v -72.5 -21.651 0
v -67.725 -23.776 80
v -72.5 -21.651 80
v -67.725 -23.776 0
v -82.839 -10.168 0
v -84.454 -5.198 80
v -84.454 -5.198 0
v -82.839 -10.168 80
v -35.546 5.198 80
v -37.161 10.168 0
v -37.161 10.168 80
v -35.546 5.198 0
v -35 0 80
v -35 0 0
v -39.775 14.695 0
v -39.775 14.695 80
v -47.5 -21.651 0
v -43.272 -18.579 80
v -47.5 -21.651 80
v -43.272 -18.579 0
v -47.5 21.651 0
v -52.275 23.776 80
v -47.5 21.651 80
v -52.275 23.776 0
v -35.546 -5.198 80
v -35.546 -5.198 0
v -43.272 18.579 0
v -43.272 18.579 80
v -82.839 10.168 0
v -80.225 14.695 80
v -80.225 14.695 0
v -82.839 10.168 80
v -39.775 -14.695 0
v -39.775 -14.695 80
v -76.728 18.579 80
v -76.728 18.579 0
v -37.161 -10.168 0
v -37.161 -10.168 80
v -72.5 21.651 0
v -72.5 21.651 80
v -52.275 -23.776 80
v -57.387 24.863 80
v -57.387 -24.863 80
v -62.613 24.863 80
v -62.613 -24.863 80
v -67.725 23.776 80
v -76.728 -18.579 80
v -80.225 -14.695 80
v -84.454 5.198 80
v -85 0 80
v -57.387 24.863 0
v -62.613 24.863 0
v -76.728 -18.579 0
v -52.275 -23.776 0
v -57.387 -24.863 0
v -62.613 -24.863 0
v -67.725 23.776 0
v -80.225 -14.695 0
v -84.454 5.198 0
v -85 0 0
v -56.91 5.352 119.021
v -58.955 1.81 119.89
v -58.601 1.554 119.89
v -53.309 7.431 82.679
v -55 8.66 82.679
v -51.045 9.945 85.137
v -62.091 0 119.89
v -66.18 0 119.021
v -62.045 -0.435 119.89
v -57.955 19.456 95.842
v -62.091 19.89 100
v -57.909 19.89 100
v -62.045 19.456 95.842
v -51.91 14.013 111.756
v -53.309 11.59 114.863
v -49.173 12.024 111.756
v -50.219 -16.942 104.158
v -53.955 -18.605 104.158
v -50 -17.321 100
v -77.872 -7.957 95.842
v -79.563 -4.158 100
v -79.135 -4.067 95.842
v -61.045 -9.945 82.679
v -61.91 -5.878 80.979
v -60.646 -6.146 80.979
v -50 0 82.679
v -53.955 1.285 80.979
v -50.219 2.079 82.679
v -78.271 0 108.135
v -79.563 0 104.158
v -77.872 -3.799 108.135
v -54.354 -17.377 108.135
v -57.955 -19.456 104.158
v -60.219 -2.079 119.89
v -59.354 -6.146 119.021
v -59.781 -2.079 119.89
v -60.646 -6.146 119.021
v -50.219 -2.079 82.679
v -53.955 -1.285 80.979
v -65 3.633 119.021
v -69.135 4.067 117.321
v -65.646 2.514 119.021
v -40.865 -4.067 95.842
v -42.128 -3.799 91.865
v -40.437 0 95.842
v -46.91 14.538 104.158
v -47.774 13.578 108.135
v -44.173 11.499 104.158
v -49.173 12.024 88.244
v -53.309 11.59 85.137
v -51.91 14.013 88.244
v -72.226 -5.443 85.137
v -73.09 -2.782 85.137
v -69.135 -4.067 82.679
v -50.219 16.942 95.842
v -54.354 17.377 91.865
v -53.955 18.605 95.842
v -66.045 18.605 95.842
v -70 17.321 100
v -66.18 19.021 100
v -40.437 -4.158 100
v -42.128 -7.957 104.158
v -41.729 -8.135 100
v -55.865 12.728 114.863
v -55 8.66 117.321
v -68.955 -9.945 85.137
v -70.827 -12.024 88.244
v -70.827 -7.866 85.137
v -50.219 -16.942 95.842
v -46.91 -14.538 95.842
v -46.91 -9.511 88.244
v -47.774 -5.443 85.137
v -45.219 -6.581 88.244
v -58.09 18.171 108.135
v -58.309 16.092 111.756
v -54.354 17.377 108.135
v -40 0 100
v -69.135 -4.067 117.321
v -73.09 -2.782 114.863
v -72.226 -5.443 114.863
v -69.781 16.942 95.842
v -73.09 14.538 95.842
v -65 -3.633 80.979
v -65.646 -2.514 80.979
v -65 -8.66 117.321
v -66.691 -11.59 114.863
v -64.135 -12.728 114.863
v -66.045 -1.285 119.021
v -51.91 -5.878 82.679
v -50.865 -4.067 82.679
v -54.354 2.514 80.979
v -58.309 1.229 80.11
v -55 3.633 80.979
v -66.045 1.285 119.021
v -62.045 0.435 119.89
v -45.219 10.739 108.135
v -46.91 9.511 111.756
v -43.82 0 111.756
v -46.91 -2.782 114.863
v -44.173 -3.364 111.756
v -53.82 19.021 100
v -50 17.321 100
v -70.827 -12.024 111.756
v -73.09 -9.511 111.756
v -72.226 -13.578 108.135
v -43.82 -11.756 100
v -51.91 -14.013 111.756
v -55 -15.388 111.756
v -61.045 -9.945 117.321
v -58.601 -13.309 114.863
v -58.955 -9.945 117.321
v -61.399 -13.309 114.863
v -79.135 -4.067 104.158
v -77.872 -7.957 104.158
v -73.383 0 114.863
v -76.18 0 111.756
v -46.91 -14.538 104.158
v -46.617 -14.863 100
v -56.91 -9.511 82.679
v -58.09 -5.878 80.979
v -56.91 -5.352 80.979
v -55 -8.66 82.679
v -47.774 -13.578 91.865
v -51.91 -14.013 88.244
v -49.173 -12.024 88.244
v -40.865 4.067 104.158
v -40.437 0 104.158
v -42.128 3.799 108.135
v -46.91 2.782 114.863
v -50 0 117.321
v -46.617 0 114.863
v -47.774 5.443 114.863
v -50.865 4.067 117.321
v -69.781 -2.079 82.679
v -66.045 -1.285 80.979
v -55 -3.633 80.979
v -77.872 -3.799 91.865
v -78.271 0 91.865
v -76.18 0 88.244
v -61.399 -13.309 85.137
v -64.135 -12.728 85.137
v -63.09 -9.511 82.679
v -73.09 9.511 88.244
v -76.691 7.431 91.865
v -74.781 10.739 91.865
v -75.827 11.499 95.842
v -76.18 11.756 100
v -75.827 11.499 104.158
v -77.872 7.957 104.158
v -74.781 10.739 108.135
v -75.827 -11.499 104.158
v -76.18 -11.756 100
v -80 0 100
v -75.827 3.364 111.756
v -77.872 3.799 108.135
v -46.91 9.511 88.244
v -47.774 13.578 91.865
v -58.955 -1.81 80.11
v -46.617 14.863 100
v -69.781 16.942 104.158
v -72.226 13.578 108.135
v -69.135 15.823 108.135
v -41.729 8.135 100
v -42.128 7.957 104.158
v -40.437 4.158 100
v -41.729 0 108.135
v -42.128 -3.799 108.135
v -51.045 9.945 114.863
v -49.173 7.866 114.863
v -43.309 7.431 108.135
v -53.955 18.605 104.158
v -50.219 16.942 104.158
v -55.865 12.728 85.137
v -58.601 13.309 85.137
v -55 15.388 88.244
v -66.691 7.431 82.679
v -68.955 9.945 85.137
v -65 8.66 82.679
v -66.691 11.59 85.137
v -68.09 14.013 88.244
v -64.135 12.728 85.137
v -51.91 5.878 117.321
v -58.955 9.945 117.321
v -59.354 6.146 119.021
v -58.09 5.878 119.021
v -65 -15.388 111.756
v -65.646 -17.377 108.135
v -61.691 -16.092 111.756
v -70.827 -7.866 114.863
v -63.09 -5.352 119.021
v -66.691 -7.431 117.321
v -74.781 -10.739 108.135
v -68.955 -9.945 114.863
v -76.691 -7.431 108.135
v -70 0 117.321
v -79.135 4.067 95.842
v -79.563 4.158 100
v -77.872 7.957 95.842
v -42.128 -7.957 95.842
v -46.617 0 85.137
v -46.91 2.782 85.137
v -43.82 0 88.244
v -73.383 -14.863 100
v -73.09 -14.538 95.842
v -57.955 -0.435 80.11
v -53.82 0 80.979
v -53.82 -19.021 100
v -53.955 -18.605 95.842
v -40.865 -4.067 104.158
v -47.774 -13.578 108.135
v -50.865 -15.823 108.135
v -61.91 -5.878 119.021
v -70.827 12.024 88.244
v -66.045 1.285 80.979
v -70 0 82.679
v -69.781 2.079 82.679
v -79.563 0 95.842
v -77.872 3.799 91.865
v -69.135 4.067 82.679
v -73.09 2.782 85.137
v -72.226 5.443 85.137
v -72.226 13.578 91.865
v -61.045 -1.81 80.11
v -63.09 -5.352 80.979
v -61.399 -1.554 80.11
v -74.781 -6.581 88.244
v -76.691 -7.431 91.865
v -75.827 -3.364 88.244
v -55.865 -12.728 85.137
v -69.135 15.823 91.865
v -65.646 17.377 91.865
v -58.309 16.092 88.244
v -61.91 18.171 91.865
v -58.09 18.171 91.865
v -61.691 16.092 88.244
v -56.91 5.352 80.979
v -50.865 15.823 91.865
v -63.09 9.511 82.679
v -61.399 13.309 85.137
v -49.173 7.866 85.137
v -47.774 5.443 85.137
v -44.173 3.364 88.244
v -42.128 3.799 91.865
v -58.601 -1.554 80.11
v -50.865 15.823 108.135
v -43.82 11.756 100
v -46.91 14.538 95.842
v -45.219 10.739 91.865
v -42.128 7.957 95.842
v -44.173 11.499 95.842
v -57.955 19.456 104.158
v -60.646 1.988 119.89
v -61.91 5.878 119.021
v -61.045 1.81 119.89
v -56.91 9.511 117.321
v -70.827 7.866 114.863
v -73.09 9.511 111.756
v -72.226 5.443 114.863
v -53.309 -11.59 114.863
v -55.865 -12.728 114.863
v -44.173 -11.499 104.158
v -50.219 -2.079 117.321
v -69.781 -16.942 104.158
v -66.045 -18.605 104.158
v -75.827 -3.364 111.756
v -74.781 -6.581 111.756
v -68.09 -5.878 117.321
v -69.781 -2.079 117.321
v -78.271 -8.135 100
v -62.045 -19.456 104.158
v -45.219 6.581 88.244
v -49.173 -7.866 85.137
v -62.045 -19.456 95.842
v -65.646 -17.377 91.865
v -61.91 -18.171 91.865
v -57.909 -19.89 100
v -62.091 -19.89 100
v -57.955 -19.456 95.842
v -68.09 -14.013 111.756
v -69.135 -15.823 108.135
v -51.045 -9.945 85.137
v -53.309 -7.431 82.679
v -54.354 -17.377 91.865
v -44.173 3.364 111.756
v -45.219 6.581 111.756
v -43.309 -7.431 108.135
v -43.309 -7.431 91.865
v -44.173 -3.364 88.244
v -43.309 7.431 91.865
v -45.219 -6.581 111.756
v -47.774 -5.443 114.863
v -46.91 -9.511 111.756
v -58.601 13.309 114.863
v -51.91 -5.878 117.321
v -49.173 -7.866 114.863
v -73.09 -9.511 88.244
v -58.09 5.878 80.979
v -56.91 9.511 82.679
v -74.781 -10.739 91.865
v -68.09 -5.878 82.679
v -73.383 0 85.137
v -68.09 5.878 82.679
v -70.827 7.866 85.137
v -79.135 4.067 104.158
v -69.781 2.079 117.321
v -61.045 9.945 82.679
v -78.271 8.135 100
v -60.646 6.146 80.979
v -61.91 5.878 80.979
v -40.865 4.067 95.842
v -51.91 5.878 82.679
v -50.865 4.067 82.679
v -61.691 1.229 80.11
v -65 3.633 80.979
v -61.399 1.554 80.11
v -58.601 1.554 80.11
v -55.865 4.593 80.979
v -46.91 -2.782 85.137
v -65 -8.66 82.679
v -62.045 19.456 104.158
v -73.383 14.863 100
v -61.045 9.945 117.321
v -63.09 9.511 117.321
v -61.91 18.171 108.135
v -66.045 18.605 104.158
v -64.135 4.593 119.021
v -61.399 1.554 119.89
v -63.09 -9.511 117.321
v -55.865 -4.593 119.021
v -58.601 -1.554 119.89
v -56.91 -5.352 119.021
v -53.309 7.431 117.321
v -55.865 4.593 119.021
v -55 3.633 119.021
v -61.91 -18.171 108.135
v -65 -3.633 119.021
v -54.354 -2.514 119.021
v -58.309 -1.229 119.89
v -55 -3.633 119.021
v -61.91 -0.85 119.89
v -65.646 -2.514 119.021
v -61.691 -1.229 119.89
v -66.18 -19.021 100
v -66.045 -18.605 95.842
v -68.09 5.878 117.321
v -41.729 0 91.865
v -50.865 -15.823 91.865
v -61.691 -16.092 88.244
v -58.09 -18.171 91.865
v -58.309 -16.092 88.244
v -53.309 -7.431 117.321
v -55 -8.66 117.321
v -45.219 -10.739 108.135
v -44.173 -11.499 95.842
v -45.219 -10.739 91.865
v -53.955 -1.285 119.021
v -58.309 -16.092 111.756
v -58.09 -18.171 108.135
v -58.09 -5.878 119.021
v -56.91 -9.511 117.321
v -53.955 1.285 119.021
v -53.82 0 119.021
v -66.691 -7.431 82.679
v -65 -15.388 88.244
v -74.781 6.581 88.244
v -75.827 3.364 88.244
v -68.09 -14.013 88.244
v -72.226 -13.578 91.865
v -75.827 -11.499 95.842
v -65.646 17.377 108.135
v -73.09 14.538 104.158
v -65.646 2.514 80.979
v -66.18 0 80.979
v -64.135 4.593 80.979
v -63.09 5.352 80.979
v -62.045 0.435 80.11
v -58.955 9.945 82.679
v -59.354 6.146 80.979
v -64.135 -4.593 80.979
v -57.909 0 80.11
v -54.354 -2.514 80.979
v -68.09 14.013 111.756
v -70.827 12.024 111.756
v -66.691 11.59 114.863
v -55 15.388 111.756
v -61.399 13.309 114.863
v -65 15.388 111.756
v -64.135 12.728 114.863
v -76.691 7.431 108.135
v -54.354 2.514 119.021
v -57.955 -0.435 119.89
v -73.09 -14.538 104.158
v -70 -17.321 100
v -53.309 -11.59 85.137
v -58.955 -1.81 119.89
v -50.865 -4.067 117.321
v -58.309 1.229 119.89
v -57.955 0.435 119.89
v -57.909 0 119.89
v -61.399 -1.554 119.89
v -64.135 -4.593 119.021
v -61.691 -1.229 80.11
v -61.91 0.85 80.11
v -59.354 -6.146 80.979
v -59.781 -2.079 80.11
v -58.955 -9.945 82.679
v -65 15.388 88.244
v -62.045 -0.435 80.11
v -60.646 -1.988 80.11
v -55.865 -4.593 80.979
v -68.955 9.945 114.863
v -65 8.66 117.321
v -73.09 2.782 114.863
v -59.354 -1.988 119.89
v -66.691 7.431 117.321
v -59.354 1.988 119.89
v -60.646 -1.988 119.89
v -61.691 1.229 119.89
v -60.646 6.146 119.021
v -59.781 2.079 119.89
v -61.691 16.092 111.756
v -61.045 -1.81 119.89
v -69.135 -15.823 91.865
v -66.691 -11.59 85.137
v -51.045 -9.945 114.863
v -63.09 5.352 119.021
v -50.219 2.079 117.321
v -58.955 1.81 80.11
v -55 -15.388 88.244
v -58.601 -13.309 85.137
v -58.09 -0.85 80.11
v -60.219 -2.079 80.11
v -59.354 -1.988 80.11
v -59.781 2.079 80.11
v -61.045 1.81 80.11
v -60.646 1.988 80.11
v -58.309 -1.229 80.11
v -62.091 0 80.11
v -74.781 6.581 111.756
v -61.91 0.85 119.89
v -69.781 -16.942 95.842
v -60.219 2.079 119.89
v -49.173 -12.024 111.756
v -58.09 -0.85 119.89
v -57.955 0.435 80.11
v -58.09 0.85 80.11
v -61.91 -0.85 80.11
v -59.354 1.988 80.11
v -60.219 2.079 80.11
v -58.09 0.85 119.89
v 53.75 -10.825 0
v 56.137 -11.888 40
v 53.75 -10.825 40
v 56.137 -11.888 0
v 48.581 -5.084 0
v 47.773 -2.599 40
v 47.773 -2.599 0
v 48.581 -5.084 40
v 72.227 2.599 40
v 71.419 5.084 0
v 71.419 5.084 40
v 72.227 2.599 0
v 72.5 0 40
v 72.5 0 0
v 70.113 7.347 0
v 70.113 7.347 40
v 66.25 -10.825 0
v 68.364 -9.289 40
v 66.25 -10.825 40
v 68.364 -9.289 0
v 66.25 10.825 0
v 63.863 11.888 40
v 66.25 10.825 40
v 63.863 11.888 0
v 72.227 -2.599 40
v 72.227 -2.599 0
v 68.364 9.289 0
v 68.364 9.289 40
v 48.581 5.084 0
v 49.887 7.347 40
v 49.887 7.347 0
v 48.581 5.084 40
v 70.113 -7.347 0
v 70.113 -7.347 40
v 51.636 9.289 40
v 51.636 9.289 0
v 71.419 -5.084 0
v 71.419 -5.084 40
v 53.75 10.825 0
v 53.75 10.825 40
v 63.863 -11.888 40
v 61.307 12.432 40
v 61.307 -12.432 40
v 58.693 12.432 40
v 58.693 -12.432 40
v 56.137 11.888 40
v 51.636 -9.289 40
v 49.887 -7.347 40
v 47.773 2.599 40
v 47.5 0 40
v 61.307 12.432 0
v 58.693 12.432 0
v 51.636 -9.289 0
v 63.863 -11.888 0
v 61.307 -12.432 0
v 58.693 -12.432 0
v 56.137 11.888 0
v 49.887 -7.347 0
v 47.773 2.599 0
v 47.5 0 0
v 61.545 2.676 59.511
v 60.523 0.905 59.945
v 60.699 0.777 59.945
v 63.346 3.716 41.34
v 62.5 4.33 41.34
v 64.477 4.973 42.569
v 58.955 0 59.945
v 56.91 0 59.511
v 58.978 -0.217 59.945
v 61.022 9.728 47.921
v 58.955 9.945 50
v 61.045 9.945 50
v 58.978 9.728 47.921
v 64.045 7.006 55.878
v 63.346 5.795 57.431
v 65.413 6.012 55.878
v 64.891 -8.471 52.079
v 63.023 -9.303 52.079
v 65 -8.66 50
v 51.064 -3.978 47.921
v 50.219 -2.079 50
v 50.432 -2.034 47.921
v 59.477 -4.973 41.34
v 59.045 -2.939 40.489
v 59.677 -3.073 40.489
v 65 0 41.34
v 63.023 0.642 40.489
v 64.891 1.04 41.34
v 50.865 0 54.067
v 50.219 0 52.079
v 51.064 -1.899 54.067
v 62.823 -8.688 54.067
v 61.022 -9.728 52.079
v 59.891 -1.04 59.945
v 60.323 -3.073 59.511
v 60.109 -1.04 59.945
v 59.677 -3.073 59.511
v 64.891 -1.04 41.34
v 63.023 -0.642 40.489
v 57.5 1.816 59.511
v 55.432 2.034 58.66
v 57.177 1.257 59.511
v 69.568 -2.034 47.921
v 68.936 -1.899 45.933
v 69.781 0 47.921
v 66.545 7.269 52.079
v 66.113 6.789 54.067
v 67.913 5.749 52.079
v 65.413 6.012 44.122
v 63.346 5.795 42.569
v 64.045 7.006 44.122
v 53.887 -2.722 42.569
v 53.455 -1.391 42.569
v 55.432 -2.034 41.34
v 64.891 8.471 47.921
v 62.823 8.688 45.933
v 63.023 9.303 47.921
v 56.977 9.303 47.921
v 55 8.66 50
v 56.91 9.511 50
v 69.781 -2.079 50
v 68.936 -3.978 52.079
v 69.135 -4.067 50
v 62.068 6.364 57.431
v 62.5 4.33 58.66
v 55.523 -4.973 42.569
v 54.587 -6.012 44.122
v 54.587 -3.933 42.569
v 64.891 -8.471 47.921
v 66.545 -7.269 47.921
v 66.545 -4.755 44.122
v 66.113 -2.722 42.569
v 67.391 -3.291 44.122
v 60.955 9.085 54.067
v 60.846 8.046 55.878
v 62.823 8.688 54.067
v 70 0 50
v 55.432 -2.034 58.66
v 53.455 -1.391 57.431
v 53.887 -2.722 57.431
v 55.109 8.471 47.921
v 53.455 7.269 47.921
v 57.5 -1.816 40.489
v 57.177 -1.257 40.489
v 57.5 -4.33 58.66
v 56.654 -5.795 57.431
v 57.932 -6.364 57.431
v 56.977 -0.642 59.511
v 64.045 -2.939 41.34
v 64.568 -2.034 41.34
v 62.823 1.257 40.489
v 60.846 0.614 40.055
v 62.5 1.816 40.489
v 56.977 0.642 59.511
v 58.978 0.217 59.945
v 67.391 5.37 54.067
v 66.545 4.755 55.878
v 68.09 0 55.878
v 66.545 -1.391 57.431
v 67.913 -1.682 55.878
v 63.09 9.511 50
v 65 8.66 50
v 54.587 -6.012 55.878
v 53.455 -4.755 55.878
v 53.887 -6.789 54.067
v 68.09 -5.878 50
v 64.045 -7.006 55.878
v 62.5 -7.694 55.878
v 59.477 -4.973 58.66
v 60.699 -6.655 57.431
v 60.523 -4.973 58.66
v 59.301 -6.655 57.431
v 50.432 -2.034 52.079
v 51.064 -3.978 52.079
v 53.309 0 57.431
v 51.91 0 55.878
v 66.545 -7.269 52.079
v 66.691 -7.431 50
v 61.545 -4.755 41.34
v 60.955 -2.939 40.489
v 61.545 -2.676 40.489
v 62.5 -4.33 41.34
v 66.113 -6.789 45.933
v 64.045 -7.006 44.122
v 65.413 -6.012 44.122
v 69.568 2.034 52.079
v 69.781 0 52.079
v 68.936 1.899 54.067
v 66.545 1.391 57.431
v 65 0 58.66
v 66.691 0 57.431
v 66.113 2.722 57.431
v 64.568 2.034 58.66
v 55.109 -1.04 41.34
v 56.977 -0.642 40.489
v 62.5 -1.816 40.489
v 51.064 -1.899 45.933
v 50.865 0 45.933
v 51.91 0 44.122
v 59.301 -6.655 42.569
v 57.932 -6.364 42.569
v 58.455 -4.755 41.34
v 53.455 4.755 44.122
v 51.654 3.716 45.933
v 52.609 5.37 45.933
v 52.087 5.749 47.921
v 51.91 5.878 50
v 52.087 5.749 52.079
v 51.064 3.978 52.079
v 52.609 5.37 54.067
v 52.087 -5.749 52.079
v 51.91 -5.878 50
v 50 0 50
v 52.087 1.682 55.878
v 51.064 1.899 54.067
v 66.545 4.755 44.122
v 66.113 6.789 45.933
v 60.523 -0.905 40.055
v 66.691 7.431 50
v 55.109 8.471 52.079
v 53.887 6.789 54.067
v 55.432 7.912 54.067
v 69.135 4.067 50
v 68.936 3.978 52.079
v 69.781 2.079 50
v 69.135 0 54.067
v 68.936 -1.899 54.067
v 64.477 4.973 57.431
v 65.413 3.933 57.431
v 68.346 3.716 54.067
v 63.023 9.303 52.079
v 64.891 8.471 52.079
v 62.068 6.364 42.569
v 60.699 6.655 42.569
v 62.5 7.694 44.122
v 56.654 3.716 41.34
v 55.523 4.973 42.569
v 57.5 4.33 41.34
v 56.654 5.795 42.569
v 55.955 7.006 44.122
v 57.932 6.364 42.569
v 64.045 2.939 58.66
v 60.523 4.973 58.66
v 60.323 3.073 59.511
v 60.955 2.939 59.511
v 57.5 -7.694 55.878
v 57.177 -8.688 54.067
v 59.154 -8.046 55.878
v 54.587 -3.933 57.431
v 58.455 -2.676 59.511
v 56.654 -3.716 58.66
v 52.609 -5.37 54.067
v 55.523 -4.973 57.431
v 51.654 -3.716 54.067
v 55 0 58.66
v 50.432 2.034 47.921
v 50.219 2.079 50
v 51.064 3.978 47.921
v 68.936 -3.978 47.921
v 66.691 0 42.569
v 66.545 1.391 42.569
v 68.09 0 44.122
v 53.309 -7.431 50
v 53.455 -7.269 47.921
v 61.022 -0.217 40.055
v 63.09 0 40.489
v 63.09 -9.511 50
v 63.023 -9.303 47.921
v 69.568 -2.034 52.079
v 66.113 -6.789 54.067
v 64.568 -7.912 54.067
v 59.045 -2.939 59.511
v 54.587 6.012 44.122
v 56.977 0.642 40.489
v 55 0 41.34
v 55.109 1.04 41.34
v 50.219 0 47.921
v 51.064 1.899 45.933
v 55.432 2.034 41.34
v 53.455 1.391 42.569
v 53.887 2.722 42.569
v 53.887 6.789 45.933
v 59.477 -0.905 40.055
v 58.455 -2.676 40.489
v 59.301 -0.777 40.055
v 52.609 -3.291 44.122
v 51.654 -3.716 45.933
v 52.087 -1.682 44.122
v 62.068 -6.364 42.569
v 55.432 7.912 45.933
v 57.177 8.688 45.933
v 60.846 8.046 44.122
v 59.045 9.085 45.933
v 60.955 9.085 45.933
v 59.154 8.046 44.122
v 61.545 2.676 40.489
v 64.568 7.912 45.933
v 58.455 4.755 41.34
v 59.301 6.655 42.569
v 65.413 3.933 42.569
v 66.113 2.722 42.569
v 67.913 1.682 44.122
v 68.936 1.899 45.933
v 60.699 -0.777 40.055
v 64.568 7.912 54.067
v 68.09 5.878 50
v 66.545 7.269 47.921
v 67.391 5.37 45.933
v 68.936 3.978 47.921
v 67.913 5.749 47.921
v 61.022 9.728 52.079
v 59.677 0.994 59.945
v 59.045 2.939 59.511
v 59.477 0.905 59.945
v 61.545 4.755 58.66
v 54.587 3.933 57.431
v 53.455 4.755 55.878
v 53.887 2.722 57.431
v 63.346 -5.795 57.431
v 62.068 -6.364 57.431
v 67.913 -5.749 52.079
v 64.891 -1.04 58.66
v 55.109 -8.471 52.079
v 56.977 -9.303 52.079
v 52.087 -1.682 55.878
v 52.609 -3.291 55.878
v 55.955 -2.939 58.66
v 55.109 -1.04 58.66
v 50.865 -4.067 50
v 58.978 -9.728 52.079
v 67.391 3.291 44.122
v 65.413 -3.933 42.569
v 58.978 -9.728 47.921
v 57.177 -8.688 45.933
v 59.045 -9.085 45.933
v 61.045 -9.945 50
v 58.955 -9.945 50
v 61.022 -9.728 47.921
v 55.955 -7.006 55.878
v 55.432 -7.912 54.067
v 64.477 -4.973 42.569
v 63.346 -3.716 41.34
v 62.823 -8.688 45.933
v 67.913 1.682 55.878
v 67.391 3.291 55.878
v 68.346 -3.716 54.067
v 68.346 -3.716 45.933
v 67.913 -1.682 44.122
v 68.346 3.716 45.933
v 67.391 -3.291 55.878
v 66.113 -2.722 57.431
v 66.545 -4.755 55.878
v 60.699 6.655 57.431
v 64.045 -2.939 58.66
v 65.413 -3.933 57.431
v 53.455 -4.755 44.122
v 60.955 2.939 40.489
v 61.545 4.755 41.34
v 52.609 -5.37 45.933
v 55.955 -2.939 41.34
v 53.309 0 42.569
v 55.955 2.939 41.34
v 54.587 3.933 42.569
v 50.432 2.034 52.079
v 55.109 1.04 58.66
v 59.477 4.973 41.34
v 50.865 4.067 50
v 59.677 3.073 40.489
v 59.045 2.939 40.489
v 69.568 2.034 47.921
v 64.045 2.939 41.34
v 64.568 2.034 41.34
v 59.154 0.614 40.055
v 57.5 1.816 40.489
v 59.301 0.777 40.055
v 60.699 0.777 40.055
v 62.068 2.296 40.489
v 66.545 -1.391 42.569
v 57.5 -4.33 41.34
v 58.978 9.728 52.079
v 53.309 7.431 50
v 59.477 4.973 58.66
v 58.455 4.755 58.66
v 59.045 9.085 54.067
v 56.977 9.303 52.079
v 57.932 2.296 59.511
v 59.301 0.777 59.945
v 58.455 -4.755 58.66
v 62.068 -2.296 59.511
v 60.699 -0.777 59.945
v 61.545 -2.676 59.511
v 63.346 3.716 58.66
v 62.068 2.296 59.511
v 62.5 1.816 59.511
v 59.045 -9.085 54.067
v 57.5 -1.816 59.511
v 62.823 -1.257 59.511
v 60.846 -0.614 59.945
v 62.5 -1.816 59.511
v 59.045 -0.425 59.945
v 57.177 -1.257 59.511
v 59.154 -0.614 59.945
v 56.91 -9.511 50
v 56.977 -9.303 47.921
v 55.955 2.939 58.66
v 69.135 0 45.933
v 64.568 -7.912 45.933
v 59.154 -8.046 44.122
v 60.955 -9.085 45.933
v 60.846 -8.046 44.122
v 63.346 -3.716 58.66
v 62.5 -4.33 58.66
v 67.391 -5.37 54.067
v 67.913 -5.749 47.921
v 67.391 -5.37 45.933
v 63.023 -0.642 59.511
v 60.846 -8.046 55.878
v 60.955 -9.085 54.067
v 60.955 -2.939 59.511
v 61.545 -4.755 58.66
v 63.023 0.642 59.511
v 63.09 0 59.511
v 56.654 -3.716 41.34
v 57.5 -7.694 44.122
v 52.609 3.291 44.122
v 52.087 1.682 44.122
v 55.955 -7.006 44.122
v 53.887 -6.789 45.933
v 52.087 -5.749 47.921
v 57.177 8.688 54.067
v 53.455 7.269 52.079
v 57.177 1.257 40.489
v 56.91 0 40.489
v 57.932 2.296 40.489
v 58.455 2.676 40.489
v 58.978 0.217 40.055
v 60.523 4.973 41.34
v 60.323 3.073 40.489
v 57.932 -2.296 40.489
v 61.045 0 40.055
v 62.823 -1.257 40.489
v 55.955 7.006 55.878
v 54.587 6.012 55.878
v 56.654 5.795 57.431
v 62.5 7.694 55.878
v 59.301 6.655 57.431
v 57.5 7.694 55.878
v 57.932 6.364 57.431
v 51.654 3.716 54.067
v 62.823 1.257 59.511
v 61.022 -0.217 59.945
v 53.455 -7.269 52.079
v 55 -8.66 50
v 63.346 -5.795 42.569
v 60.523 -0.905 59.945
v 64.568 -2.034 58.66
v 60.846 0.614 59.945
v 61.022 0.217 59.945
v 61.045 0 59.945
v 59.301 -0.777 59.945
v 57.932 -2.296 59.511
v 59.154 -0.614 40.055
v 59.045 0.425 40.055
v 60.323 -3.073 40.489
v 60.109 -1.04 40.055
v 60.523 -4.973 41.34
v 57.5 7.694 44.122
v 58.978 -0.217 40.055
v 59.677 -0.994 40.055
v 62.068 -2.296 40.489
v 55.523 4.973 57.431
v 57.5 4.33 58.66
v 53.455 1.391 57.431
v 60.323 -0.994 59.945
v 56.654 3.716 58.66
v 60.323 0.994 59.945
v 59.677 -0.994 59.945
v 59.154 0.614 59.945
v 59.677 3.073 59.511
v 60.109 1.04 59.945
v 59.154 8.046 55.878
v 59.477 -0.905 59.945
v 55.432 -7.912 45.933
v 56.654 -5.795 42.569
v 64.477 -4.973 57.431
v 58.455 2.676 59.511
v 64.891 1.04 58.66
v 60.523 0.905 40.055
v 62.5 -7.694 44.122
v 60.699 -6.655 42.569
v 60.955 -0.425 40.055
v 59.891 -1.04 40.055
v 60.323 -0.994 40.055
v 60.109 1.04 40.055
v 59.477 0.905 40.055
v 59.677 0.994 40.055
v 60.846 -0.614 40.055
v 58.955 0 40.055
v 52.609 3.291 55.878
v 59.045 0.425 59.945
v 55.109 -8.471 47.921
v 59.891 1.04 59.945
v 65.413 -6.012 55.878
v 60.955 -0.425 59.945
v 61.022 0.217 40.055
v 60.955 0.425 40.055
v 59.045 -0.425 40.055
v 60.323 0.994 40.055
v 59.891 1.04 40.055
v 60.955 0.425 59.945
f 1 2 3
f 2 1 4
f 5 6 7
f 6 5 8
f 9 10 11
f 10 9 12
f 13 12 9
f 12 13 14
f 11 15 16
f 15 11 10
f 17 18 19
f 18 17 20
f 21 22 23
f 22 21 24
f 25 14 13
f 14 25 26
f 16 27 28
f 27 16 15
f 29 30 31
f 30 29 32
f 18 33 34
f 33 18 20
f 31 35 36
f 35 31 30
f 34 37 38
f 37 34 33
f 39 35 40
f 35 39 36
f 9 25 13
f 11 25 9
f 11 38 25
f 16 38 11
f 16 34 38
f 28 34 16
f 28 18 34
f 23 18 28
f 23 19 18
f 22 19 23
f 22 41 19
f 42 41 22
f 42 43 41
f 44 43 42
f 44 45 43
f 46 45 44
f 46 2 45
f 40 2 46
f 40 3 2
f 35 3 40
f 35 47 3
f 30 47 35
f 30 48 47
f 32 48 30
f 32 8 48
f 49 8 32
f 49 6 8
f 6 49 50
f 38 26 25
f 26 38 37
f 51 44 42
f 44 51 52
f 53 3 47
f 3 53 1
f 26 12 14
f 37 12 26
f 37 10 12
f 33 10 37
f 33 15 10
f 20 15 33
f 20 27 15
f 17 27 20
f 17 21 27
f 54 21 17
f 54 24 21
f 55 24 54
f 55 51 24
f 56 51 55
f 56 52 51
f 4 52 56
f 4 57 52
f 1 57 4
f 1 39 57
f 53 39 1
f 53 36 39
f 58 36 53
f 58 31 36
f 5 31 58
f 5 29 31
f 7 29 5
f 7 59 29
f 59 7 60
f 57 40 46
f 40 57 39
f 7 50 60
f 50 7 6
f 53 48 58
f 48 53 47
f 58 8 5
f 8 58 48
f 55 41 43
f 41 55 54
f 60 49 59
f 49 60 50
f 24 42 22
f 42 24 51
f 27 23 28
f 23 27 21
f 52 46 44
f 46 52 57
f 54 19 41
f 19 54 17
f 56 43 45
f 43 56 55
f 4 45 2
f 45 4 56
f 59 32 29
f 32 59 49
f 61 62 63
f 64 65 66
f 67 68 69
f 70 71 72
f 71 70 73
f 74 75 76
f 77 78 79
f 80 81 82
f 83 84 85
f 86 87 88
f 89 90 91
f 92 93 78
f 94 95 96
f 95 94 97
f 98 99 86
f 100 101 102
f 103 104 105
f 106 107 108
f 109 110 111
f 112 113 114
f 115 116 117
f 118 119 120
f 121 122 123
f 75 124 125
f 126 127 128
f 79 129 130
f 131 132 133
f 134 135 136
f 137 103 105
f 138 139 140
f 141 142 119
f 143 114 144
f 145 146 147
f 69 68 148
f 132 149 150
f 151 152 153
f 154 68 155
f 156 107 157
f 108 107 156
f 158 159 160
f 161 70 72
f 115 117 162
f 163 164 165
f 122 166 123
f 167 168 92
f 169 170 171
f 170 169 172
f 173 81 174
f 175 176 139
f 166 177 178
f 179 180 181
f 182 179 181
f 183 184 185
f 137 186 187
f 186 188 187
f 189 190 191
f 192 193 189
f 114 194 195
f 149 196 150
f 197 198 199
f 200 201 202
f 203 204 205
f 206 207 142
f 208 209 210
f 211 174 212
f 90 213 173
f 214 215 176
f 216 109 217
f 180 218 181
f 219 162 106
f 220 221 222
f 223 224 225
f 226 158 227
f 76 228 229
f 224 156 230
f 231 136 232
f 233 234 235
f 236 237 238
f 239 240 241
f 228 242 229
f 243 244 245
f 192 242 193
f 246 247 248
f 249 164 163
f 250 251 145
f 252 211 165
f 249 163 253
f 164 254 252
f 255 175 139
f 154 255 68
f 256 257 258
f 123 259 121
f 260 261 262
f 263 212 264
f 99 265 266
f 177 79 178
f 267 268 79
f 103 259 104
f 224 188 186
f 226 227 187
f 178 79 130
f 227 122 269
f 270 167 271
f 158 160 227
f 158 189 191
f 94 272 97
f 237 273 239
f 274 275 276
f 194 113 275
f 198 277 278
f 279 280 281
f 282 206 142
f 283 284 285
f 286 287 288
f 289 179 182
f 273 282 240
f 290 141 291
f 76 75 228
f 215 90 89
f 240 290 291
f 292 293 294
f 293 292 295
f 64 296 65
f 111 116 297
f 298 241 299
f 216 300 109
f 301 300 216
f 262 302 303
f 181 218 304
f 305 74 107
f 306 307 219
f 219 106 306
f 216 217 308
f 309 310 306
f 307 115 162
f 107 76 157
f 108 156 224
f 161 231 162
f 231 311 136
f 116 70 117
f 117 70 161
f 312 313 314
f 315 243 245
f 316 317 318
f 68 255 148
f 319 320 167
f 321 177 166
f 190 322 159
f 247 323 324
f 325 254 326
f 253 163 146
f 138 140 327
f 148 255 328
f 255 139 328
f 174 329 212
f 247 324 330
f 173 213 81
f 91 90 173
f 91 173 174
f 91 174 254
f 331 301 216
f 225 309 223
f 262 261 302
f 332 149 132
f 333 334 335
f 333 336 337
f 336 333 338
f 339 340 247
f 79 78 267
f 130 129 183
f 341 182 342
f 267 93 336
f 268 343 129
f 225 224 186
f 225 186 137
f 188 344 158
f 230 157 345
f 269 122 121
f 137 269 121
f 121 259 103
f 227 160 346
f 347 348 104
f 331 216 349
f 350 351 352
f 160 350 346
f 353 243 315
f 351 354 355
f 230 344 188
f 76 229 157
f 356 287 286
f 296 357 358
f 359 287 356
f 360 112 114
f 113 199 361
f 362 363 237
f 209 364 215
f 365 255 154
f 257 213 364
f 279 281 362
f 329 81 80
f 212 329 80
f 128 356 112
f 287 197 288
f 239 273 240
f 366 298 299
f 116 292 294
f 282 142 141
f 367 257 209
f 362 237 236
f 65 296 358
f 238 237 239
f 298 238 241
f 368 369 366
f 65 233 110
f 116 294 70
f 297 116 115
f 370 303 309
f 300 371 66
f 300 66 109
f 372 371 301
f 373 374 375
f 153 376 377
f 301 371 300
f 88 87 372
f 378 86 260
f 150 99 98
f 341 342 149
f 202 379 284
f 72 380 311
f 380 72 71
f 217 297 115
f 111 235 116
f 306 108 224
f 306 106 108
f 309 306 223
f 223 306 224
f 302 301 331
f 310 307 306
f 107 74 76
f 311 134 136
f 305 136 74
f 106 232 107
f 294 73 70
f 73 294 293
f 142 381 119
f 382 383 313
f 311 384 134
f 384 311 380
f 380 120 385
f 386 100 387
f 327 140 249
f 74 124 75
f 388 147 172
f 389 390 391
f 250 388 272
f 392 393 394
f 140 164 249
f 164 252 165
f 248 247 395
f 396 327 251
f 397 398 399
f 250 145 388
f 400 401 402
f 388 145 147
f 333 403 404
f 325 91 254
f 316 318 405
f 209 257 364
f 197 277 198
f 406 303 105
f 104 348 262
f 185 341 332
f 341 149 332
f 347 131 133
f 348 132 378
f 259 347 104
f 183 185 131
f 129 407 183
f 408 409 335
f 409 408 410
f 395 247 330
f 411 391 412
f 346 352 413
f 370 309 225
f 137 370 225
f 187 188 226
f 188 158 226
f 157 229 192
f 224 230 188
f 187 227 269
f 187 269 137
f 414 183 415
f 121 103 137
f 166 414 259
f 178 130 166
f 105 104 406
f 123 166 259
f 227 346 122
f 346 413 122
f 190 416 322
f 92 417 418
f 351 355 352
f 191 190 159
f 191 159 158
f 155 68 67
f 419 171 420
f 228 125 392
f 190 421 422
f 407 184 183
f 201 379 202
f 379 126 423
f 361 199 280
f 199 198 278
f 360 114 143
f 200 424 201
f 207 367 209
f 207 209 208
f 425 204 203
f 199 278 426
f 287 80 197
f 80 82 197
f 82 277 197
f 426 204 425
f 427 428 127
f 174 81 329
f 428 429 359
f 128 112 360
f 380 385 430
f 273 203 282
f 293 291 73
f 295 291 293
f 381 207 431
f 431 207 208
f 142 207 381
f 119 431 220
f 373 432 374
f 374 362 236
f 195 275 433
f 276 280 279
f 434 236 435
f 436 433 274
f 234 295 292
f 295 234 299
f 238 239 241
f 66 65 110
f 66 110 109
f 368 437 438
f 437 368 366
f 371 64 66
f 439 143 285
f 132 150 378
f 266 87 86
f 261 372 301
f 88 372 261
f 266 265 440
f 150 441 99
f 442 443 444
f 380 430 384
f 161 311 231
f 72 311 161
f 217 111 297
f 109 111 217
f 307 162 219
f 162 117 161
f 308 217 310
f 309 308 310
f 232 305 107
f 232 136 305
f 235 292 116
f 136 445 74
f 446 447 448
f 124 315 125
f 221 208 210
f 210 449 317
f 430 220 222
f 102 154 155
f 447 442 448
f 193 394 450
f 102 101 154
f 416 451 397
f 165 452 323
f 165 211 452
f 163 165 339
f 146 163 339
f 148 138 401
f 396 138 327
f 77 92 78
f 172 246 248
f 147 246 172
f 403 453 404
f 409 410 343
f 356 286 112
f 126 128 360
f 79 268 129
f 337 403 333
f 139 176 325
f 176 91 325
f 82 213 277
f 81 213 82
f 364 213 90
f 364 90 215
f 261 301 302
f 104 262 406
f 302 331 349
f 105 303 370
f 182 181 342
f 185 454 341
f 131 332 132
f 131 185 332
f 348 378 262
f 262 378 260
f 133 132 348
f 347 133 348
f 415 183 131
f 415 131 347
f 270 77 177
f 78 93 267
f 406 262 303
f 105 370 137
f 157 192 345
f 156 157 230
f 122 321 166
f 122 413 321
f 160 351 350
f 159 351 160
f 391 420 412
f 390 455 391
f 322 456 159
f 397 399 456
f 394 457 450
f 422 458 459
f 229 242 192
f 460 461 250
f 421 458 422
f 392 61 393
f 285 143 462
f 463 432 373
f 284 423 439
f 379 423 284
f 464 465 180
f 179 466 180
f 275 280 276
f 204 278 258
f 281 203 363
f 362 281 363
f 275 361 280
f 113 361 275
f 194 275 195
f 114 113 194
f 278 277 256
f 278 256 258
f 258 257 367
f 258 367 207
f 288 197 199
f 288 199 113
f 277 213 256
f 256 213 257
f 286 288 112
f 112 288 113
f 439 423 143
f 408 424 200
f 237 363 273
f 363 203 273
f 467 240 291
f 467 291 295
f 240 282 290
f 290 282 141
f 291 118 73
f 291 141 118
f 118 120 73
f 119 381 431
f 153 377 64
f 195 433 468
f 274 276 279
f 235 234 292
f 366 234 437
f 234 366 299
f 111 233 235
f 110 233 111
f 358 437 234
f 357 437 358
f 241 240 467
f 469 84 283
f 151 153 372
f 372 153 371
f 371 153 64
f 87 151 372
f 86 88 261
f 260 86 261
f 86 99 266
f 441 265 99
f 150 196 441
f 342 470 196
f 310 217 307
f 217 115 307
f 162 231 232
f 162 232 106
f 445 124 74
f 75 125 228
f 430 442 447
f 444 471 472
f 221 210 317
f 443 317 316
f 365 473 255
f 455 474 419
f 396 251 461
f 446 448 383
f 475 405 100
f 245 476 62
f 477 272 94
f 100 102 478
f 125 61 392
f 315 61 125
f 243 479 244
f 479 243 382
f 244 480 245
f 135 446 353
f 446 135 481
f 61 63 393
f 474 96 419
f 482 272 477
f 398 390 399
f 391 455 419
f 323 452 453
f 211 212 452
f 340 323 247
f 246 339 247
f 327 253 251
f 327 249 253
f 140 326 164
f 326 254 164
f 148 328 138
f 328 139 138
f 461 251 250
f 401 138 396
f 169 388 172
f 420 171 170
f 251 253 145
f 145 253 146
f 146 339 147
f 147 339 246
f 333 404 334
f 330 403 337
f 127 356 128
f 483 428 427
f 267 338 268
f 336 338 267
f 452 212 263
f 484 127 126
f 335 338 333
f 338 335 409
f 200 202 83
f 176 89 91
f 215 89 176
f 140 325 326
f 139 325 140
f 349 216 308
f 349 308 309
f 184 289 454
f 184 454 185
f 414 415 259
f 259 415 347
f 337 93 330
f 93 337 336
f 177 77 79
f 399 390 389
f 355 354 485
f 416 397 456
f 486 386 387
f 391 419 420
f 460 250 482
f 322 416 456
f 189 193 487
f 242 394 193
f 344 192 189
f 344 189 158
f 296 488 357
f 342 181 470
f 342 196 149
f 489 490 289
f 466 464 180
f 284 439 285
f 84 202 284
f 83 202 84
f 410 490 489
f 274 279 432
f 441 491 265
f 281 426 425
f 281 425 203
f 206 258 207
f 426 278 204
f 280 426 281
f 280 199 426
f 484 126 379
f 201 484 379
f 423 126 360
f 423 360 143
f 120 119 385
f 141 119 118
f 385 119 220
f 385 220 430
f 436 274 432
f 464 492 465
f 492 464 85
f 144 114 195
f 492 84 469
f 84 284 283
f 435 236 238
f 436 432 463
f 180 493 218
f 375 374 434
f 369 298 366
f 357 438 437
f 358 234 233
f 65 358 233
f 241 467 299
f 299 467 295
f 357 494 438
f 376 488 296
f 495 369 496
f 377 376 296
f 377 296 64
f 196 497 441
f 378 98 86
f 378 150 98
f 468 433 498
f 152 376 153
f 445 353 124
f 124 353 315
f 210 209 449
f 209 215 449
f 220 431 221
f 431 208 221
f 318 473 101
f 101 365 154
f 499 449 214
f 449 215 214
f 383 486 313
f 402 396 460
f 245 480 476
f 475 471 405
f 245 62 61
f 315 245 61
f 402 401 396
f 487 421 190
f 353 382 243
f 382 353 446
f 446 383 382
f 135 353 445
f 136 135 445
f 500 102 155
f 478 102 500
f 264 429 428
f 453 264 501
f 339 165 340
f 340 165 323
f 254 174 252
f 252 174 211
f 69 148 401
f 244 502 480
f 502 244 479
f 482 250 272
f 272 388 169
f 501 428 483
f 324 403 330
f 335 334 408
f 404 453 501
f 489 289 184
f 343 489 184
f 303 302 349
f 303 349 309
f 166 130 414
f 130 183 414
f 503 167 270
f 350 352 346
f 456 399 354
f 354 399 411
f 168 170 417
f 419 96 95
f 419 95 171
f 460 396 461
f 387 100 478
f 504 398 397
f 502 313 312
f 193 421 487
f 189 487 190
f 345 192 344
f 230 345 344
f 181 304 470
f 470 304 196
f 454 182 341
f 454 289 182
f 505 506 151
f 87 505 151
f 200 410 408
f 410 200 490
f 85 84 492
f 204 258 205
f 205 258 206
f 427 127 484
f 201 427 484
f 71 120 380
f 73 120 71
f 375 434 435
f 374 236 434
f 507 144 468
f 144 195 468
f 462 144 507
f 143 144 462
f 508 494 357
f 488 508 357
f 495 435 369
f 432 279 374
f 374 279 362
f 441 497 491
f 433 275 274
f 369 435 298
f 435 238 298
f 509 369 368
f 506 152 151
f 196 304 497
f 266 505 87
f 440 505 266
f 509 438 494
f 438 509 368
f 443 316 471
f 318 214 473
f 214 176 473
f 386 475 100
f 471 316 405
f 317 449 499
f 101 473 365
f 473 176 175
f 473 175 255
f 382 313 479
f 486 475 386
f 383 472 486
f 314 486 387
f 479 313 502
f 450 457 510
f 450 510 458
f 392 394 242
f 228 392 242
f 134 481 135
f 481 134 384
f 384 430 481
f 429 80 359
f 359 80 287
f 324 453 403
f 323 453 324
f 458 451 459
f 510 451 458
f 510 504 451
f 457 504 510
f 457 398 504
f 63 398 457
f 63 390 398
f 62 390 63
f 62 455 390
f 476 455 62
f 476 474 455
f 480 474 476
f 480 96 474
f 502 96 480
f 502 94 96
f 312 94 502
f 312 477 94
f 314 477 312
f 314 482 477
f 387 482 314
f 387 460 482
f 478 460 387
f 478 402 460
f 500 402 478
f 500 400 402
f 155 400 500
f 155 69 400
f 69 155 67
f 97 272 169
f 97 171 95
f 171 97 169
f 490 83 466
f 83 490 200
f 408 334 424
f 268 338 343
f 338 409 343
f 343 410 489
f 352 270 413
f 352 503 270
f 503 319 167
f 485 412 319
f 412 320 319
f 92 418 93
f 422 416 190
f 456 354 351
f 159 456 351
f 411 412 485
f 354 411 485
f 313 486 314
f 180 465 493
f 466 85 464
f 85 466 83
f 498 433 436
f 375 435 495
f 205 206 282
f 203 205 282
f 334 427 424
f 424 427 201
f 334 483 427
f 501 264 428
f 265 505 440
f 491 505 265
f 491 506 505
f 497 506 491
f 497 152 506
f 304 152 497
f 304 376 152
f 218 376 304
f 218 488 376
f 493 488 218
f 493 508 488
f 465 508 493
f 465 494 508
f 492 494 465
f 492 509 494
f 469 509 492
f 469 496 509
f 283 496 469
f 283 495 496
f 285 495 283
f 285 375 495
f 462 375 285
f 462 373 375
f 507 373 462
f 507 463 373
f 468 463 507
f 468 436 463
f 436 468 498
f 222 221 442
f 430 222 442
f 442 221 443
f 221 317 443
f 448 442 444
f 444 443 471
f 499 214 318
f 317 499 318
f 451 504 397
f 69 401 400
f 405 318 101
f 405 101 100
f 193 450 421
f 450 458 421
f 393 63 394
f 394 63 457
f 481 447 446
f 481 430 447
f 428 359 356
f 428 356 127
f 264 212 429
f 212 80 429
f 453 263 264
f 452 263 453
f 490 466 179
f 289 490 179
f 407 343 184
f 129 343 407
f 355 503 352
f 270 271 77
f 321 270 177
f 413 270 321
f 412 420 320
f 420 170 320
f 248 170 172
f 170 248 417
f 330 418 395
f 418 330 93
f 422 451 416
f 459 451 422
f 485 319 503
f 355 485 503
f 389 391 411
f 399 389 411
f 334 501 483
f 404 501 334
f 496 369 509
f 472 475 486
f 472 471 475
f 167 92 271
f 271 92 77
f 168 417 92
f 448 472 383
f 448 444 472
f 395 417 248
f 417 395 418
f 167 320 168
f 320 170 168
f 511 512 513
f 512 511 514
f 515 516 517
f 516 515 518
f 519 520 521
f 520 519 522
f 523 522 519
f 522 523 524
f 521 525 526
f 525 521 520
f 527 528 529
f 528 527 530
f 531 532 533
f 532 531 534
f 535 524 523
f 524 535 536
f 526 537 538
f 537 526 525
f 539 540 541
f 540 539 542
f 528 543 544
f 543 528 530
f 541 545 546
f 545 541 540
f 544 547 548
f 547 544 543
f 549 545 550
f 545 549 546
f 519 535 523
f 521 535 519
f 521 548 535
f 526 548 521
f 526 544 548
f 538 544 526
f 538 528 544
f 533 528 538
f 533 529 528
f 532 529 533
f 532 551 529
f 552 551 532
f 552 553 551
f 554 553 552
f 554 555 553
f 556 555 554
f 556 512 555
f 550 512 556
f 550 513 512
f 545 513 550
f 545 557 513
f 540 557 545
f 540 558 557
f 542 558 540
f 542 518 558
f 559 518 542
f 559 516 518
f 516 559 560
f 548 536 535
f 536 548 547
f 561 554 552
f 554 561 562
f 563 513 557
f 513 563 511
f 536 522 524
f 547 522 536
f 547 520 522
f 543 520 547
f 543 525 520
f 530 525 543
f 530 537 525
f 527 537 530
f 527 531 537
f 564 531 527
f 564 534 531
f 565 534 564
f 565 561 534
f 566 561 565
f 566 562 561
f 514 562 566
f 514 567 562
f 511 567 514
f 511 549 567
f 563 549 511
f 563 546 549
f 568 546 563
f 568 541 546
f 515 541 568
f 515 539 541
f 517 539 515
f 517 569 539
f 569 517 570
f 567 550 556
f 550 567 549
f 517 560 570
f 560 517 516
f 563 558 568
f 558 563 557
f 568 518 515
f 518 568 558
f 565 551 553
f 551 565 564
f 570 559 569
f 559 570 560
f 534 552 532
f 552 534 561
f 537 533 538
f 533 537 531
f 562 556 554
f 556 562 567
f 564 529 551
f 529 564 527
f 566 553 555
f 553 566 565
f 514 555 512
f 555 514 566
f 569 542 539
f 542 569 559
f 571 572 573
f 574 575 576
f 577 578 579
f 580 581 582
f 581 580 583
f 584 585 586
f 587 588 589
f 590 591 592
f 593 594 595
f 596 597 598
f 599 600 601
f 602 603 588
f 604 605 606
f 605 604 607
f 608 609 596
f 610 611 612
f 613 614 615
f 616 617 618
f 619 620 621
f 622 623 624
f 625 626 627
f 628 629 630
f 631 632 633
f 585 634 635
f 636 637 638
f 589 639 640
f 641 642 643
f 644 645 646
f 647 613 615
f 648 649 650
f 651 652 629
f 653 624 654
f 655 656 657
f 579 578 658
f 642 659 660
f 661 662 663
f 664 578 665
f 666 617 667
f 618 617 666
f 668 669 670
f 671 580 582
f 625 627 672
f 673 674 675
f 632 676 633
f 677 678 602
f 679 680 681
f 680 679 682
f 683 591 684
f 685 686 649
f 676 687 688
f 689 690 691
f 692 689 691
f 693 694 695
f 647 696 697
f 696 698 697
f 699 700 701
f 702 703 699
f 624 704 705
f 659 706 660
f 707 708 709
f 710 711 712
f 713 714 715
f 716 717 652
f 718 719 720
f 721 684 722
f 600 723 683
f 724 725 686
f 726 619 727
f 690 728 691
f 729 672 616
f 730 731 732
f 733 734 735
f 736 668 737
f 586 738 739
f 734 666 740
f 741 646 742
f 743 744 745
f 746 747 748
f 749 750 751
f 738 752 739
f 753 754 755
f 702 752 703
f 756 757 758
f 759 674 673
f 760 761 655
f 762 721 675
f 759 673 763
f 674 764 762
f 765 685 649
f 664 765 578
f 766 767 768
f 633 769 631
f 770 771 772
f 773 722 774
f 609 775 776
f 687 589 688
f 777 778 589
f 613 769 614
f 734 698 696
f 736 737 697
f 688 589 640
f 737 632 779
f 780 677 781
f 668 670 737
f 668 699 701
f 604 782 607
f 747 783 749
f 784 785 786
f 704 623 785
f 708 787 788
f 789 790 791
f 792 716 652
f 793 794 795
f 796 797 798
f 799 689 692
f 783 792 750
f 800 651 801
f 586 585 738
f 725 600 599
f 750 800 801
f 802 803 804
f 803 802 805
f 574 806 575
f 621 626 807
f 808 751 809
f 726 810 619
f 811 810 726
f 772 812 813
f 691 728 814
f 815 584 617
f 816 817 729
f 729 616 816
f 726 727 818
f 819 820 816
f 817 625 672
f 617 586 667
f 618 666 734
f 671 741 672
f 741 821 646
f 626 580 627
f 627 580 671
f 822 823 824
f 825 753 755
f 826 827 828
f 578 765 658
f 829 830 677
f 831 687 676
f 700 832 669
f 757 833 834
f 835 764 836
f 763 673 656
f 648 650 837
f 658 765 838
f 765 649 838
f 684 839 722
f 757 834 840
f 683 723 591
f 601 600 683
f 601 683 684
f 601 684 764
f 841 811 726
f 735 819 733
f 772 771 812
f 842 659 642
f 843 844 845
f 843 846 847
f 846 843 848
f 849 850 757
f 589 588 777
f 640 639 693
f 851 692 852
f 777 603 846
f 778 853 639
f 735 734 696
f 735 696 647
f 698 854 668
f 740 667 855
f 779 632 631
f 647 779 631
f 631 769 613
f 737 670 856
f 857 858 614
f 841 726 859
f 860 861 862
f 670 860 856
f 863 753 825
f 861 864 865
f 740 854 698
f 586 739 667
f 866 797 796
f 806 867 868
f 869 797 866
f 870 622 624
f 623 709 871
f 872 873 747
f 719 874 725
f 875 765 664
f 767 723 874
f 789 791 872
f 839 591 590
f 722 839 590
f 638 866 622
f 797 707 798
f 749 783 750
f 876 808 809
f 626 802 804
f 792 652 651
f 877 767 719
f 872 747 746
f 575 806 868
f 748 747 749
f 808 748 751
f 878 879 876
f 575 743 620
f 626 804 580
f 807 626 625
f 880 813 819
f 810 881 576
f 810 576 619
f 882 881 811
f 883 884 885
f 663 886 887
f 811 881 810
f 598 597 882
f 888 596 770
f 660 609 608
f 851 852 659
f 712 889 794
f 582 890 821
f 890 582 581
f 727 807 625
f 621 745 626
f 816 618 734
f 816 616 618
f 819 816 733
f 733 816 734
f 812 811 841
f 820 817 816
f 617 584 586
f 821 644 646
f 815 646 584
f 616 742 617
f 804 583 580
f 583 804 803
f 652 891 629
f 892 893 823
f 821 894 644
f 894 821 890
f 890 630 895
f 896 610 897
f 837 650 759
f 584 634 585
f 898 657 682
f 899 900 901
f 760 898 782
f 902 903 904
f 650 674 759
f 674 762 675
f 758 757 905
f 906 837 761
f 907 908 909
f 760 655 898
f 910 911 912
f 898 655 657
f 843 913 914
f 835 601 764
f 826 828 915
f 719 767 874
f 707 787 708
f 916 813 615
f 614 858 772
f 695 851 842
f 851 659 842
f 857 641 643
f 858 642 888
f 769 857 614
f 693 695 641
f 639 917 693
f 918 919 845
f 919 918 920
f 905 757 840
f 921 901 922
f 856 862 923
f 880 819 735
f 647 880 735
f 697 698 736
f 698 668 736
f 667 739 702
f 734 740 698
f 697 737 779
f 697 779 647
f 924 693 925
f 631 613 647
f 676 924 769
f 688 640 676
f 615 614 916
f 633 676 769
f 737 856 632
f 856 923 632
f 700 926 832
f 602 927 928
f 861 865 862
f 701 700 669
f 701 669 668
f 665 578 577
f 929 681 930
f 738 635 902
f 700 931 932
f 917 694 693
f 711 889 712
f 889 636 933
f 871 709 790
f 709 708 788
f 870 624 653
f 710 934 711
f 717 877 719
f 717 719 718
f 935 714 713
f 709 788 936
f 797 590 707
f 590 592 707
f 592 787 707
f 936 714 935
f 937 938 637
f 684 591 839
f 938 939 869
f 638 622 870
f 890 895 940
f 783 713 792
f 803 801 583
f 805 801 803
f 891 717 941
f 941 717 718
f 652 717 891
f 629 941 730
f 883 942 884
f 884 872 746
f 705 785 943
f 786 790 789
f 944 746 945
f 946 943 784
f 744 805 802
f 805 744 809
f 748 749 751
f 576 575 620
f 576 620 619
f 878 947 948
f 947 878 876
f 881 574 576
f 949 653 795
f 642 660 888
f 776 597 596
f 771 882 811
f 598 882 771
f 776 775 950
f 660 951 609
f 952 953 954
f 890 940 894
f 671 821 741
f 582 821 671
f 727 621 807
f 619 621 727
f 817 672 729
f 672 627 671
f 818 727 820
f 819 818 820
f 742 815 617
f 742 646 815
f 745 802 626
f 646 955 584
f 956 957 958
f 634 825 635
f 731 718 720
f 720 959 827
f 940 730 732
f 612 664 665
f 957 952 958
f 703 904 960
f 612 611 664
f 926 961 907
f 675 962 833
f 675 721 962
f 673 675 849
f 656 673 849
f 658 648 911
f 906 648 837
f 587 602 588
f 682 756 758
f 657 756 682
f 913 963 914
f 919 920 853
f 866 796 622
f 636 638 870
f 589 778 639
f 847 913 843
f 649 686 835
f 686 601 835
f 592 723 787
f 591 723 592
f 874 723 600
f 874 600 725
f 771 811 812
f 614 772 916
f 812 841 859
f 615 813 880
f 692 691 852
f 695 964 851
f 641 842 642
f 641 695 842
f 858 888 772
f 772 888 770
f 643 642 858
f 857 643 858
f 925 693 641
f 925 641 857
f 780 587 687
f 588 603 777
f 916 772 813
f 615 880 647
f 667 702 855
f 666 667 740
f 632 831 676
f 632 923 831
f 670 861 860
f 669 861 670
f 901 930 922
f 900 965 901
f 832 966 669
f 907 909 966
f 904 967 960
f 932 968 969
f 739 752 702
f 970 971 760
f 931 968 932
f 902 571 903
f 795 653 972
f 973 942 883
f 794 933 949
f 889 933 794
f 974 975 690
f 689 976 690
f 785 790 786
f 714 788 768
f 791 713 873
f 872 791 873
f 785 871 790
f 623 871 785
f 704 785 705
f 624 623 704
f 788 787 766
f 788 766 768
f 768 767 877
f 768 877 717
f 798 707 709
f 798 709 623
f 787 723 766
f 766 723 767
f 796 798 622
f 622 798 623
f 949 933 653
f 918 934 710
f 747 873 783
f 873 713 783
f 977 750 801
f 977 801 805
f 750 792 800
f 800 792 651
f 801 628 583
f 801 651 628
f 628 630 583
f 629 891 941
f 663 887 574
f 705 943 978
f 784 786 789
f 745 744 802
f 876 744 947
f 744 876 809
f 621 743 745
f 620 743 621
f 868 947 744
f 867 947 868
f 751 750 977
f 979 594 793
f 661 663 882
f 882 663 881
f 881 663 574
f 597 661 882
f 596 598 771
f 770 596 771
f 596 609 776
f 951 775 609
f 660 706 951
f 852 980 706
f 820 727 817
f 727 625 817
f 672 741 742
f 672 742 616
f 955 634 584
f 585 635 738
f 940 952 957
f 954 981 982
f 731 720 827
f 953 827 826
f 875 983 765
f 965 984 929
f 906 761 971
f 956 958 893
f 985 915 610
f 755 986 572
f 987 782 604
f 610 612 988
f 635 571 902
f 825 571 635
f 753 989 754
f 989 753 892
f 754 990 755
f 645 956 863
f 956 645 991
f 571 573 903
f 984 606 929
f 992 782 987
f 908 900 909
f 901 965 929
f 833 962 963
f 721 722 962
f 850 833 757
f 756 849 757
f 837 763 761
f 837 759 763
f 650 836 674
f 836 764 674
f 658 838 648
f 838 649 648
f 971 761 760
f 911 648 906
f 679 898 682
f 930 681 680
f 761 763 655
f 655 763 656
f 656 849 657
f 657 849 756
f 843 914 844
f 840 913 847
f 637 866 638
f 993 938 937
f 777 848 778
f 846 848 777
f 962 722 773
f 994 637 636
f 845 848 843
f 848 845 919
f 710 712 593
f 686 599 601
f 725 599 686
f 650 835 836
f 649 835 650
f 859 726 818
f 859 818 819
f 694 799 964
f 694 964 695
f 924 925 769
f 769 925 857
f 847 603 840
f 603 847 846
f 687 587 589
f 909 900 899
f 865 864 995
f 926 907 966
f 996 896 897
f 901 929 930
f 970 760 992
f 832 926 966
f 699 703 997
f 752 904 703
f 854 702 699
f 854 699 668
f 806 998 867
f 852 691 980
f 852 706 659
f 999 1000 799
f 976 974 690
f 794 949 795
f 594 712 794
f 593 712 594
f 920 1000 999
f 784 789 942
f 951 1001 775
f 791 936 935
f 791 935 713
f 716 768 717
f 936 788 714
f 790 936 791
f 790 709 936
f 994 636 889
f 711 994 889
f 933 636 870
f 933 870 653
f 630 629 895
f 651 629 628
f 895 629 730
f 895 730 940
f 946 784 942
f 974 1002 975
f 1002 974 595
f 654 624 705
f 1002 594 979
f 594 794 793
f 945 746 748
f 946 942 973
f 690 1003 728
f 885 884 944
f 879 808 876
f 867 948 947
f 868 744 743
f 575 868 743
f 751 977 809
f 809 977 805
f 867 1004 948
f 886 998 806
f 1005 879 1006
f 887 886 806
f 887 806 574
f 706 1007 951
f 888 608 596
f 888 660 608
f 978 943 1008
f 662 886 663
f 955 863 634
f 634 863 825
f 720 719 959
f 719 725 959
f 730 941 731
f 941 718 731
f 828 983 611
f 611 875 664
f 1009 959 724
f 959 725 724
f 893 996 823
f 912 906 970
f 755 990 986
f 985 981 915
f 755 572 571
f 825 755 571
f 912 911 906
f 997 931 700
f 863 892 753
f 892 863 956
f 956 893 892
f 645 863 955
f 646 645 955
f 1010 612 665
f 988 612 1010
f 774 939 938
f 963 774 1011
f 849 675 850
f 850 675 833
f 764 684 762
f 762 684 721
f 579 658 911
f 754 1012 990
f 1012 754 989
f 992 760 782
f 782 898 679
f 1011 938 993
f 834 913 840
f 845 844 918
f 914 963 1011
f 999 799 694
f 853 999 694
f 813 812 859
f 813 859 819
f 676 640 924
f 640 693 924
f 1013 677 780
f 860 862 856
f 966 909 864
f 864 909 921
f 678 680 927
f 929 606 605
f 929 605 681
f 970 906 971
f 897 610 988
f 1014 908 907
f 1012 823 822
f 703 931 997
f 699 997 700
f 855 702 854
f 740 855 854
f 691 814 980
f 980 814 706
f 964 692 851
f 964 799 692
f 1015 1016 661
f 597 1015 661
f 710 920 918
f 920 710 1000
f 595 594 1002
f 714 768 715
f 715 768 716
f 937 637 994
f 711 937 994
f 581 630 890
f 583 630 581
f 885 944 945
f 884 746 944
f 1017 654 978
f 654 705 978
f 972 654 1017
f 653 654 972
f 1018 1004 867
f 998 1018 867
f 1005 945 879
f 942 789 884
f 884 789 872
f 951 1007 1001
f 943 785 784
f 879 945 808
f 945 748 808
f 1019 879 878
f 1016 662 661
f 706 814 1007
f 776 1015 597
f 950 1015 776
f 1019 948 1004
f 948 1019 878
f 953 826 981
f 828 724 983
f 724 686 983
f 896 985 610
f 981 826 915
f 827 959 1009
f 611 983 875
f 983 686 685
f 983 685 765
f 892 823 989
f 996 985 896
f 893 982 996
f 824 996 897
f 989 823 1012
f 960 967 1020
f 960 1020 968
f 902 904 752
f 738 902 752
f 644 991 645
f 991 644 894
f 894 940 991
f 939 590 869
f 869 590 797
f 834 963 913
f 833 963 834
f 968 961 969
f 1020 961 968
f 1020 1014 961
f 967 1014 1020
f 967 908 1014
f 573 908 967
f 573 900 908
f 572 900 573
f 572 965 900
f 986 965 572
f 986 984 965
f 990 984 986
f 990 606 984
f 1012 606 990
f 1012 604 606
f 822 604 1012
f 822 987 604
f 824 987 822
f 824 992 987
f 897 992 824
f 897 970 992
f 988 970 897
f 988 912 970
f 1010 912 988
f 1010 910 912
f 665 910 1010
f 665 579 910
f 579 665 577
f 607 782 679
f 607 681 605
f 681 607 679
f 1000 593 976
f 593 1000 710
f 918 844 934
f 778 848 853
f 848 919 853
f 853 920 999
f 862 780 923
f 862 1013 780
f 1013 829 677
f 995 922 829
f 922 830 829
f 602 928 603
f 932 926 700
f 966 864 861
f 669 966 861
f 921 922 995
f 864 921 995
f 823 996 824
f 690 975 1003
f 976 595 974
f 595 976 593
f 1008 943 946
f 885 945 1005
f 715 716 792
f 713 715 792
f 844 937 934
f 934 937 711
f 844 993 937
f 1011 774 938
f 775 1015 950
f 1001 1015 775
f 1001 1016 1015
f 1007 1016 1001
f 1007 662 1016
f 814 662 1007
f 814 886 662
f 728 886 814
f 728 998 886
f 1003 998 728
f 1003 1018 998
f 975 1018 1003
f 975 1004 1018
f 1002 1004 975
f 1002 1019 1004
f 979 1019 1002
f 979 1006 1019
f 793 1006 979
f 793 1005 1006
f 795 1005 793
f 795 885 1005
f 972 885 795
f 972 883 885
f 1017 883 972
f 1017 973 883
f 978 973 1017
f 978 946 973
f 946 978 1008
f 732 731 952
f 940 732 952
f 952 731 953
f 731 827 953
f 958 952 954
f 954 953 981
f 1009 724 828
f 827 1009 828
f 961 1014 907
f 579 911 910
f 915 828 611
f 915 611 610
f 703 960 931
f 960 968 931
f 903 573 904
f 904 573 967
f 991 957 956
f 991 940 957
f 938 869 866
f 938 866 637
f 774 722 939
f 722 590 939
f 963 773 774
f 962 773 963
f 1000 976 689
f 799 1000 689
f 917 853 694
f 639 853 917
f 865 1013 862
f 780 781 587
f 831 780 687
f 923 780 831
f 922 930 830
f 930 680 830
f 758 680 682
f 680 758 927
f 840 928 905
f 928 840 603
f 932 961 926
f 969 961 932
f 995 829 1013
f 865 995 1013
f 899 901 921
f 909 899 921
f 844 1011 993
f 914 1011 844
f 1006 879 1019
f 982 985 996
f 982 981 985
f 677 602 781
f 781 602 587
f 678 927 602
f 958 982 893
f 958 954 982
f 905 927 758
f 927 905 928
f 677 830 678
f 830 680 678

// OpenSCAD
module shape() {
    cylinder(h = 80, d = 50, center = false);
    translate([0, 0, 100]) 
        sphere(d = 40);
}

translate([-60, 0, 0]) 
    shape();

translate([60, 0, 0]) {
    scale([0.5, 0.5, 0.5]) 
        shape();
}
